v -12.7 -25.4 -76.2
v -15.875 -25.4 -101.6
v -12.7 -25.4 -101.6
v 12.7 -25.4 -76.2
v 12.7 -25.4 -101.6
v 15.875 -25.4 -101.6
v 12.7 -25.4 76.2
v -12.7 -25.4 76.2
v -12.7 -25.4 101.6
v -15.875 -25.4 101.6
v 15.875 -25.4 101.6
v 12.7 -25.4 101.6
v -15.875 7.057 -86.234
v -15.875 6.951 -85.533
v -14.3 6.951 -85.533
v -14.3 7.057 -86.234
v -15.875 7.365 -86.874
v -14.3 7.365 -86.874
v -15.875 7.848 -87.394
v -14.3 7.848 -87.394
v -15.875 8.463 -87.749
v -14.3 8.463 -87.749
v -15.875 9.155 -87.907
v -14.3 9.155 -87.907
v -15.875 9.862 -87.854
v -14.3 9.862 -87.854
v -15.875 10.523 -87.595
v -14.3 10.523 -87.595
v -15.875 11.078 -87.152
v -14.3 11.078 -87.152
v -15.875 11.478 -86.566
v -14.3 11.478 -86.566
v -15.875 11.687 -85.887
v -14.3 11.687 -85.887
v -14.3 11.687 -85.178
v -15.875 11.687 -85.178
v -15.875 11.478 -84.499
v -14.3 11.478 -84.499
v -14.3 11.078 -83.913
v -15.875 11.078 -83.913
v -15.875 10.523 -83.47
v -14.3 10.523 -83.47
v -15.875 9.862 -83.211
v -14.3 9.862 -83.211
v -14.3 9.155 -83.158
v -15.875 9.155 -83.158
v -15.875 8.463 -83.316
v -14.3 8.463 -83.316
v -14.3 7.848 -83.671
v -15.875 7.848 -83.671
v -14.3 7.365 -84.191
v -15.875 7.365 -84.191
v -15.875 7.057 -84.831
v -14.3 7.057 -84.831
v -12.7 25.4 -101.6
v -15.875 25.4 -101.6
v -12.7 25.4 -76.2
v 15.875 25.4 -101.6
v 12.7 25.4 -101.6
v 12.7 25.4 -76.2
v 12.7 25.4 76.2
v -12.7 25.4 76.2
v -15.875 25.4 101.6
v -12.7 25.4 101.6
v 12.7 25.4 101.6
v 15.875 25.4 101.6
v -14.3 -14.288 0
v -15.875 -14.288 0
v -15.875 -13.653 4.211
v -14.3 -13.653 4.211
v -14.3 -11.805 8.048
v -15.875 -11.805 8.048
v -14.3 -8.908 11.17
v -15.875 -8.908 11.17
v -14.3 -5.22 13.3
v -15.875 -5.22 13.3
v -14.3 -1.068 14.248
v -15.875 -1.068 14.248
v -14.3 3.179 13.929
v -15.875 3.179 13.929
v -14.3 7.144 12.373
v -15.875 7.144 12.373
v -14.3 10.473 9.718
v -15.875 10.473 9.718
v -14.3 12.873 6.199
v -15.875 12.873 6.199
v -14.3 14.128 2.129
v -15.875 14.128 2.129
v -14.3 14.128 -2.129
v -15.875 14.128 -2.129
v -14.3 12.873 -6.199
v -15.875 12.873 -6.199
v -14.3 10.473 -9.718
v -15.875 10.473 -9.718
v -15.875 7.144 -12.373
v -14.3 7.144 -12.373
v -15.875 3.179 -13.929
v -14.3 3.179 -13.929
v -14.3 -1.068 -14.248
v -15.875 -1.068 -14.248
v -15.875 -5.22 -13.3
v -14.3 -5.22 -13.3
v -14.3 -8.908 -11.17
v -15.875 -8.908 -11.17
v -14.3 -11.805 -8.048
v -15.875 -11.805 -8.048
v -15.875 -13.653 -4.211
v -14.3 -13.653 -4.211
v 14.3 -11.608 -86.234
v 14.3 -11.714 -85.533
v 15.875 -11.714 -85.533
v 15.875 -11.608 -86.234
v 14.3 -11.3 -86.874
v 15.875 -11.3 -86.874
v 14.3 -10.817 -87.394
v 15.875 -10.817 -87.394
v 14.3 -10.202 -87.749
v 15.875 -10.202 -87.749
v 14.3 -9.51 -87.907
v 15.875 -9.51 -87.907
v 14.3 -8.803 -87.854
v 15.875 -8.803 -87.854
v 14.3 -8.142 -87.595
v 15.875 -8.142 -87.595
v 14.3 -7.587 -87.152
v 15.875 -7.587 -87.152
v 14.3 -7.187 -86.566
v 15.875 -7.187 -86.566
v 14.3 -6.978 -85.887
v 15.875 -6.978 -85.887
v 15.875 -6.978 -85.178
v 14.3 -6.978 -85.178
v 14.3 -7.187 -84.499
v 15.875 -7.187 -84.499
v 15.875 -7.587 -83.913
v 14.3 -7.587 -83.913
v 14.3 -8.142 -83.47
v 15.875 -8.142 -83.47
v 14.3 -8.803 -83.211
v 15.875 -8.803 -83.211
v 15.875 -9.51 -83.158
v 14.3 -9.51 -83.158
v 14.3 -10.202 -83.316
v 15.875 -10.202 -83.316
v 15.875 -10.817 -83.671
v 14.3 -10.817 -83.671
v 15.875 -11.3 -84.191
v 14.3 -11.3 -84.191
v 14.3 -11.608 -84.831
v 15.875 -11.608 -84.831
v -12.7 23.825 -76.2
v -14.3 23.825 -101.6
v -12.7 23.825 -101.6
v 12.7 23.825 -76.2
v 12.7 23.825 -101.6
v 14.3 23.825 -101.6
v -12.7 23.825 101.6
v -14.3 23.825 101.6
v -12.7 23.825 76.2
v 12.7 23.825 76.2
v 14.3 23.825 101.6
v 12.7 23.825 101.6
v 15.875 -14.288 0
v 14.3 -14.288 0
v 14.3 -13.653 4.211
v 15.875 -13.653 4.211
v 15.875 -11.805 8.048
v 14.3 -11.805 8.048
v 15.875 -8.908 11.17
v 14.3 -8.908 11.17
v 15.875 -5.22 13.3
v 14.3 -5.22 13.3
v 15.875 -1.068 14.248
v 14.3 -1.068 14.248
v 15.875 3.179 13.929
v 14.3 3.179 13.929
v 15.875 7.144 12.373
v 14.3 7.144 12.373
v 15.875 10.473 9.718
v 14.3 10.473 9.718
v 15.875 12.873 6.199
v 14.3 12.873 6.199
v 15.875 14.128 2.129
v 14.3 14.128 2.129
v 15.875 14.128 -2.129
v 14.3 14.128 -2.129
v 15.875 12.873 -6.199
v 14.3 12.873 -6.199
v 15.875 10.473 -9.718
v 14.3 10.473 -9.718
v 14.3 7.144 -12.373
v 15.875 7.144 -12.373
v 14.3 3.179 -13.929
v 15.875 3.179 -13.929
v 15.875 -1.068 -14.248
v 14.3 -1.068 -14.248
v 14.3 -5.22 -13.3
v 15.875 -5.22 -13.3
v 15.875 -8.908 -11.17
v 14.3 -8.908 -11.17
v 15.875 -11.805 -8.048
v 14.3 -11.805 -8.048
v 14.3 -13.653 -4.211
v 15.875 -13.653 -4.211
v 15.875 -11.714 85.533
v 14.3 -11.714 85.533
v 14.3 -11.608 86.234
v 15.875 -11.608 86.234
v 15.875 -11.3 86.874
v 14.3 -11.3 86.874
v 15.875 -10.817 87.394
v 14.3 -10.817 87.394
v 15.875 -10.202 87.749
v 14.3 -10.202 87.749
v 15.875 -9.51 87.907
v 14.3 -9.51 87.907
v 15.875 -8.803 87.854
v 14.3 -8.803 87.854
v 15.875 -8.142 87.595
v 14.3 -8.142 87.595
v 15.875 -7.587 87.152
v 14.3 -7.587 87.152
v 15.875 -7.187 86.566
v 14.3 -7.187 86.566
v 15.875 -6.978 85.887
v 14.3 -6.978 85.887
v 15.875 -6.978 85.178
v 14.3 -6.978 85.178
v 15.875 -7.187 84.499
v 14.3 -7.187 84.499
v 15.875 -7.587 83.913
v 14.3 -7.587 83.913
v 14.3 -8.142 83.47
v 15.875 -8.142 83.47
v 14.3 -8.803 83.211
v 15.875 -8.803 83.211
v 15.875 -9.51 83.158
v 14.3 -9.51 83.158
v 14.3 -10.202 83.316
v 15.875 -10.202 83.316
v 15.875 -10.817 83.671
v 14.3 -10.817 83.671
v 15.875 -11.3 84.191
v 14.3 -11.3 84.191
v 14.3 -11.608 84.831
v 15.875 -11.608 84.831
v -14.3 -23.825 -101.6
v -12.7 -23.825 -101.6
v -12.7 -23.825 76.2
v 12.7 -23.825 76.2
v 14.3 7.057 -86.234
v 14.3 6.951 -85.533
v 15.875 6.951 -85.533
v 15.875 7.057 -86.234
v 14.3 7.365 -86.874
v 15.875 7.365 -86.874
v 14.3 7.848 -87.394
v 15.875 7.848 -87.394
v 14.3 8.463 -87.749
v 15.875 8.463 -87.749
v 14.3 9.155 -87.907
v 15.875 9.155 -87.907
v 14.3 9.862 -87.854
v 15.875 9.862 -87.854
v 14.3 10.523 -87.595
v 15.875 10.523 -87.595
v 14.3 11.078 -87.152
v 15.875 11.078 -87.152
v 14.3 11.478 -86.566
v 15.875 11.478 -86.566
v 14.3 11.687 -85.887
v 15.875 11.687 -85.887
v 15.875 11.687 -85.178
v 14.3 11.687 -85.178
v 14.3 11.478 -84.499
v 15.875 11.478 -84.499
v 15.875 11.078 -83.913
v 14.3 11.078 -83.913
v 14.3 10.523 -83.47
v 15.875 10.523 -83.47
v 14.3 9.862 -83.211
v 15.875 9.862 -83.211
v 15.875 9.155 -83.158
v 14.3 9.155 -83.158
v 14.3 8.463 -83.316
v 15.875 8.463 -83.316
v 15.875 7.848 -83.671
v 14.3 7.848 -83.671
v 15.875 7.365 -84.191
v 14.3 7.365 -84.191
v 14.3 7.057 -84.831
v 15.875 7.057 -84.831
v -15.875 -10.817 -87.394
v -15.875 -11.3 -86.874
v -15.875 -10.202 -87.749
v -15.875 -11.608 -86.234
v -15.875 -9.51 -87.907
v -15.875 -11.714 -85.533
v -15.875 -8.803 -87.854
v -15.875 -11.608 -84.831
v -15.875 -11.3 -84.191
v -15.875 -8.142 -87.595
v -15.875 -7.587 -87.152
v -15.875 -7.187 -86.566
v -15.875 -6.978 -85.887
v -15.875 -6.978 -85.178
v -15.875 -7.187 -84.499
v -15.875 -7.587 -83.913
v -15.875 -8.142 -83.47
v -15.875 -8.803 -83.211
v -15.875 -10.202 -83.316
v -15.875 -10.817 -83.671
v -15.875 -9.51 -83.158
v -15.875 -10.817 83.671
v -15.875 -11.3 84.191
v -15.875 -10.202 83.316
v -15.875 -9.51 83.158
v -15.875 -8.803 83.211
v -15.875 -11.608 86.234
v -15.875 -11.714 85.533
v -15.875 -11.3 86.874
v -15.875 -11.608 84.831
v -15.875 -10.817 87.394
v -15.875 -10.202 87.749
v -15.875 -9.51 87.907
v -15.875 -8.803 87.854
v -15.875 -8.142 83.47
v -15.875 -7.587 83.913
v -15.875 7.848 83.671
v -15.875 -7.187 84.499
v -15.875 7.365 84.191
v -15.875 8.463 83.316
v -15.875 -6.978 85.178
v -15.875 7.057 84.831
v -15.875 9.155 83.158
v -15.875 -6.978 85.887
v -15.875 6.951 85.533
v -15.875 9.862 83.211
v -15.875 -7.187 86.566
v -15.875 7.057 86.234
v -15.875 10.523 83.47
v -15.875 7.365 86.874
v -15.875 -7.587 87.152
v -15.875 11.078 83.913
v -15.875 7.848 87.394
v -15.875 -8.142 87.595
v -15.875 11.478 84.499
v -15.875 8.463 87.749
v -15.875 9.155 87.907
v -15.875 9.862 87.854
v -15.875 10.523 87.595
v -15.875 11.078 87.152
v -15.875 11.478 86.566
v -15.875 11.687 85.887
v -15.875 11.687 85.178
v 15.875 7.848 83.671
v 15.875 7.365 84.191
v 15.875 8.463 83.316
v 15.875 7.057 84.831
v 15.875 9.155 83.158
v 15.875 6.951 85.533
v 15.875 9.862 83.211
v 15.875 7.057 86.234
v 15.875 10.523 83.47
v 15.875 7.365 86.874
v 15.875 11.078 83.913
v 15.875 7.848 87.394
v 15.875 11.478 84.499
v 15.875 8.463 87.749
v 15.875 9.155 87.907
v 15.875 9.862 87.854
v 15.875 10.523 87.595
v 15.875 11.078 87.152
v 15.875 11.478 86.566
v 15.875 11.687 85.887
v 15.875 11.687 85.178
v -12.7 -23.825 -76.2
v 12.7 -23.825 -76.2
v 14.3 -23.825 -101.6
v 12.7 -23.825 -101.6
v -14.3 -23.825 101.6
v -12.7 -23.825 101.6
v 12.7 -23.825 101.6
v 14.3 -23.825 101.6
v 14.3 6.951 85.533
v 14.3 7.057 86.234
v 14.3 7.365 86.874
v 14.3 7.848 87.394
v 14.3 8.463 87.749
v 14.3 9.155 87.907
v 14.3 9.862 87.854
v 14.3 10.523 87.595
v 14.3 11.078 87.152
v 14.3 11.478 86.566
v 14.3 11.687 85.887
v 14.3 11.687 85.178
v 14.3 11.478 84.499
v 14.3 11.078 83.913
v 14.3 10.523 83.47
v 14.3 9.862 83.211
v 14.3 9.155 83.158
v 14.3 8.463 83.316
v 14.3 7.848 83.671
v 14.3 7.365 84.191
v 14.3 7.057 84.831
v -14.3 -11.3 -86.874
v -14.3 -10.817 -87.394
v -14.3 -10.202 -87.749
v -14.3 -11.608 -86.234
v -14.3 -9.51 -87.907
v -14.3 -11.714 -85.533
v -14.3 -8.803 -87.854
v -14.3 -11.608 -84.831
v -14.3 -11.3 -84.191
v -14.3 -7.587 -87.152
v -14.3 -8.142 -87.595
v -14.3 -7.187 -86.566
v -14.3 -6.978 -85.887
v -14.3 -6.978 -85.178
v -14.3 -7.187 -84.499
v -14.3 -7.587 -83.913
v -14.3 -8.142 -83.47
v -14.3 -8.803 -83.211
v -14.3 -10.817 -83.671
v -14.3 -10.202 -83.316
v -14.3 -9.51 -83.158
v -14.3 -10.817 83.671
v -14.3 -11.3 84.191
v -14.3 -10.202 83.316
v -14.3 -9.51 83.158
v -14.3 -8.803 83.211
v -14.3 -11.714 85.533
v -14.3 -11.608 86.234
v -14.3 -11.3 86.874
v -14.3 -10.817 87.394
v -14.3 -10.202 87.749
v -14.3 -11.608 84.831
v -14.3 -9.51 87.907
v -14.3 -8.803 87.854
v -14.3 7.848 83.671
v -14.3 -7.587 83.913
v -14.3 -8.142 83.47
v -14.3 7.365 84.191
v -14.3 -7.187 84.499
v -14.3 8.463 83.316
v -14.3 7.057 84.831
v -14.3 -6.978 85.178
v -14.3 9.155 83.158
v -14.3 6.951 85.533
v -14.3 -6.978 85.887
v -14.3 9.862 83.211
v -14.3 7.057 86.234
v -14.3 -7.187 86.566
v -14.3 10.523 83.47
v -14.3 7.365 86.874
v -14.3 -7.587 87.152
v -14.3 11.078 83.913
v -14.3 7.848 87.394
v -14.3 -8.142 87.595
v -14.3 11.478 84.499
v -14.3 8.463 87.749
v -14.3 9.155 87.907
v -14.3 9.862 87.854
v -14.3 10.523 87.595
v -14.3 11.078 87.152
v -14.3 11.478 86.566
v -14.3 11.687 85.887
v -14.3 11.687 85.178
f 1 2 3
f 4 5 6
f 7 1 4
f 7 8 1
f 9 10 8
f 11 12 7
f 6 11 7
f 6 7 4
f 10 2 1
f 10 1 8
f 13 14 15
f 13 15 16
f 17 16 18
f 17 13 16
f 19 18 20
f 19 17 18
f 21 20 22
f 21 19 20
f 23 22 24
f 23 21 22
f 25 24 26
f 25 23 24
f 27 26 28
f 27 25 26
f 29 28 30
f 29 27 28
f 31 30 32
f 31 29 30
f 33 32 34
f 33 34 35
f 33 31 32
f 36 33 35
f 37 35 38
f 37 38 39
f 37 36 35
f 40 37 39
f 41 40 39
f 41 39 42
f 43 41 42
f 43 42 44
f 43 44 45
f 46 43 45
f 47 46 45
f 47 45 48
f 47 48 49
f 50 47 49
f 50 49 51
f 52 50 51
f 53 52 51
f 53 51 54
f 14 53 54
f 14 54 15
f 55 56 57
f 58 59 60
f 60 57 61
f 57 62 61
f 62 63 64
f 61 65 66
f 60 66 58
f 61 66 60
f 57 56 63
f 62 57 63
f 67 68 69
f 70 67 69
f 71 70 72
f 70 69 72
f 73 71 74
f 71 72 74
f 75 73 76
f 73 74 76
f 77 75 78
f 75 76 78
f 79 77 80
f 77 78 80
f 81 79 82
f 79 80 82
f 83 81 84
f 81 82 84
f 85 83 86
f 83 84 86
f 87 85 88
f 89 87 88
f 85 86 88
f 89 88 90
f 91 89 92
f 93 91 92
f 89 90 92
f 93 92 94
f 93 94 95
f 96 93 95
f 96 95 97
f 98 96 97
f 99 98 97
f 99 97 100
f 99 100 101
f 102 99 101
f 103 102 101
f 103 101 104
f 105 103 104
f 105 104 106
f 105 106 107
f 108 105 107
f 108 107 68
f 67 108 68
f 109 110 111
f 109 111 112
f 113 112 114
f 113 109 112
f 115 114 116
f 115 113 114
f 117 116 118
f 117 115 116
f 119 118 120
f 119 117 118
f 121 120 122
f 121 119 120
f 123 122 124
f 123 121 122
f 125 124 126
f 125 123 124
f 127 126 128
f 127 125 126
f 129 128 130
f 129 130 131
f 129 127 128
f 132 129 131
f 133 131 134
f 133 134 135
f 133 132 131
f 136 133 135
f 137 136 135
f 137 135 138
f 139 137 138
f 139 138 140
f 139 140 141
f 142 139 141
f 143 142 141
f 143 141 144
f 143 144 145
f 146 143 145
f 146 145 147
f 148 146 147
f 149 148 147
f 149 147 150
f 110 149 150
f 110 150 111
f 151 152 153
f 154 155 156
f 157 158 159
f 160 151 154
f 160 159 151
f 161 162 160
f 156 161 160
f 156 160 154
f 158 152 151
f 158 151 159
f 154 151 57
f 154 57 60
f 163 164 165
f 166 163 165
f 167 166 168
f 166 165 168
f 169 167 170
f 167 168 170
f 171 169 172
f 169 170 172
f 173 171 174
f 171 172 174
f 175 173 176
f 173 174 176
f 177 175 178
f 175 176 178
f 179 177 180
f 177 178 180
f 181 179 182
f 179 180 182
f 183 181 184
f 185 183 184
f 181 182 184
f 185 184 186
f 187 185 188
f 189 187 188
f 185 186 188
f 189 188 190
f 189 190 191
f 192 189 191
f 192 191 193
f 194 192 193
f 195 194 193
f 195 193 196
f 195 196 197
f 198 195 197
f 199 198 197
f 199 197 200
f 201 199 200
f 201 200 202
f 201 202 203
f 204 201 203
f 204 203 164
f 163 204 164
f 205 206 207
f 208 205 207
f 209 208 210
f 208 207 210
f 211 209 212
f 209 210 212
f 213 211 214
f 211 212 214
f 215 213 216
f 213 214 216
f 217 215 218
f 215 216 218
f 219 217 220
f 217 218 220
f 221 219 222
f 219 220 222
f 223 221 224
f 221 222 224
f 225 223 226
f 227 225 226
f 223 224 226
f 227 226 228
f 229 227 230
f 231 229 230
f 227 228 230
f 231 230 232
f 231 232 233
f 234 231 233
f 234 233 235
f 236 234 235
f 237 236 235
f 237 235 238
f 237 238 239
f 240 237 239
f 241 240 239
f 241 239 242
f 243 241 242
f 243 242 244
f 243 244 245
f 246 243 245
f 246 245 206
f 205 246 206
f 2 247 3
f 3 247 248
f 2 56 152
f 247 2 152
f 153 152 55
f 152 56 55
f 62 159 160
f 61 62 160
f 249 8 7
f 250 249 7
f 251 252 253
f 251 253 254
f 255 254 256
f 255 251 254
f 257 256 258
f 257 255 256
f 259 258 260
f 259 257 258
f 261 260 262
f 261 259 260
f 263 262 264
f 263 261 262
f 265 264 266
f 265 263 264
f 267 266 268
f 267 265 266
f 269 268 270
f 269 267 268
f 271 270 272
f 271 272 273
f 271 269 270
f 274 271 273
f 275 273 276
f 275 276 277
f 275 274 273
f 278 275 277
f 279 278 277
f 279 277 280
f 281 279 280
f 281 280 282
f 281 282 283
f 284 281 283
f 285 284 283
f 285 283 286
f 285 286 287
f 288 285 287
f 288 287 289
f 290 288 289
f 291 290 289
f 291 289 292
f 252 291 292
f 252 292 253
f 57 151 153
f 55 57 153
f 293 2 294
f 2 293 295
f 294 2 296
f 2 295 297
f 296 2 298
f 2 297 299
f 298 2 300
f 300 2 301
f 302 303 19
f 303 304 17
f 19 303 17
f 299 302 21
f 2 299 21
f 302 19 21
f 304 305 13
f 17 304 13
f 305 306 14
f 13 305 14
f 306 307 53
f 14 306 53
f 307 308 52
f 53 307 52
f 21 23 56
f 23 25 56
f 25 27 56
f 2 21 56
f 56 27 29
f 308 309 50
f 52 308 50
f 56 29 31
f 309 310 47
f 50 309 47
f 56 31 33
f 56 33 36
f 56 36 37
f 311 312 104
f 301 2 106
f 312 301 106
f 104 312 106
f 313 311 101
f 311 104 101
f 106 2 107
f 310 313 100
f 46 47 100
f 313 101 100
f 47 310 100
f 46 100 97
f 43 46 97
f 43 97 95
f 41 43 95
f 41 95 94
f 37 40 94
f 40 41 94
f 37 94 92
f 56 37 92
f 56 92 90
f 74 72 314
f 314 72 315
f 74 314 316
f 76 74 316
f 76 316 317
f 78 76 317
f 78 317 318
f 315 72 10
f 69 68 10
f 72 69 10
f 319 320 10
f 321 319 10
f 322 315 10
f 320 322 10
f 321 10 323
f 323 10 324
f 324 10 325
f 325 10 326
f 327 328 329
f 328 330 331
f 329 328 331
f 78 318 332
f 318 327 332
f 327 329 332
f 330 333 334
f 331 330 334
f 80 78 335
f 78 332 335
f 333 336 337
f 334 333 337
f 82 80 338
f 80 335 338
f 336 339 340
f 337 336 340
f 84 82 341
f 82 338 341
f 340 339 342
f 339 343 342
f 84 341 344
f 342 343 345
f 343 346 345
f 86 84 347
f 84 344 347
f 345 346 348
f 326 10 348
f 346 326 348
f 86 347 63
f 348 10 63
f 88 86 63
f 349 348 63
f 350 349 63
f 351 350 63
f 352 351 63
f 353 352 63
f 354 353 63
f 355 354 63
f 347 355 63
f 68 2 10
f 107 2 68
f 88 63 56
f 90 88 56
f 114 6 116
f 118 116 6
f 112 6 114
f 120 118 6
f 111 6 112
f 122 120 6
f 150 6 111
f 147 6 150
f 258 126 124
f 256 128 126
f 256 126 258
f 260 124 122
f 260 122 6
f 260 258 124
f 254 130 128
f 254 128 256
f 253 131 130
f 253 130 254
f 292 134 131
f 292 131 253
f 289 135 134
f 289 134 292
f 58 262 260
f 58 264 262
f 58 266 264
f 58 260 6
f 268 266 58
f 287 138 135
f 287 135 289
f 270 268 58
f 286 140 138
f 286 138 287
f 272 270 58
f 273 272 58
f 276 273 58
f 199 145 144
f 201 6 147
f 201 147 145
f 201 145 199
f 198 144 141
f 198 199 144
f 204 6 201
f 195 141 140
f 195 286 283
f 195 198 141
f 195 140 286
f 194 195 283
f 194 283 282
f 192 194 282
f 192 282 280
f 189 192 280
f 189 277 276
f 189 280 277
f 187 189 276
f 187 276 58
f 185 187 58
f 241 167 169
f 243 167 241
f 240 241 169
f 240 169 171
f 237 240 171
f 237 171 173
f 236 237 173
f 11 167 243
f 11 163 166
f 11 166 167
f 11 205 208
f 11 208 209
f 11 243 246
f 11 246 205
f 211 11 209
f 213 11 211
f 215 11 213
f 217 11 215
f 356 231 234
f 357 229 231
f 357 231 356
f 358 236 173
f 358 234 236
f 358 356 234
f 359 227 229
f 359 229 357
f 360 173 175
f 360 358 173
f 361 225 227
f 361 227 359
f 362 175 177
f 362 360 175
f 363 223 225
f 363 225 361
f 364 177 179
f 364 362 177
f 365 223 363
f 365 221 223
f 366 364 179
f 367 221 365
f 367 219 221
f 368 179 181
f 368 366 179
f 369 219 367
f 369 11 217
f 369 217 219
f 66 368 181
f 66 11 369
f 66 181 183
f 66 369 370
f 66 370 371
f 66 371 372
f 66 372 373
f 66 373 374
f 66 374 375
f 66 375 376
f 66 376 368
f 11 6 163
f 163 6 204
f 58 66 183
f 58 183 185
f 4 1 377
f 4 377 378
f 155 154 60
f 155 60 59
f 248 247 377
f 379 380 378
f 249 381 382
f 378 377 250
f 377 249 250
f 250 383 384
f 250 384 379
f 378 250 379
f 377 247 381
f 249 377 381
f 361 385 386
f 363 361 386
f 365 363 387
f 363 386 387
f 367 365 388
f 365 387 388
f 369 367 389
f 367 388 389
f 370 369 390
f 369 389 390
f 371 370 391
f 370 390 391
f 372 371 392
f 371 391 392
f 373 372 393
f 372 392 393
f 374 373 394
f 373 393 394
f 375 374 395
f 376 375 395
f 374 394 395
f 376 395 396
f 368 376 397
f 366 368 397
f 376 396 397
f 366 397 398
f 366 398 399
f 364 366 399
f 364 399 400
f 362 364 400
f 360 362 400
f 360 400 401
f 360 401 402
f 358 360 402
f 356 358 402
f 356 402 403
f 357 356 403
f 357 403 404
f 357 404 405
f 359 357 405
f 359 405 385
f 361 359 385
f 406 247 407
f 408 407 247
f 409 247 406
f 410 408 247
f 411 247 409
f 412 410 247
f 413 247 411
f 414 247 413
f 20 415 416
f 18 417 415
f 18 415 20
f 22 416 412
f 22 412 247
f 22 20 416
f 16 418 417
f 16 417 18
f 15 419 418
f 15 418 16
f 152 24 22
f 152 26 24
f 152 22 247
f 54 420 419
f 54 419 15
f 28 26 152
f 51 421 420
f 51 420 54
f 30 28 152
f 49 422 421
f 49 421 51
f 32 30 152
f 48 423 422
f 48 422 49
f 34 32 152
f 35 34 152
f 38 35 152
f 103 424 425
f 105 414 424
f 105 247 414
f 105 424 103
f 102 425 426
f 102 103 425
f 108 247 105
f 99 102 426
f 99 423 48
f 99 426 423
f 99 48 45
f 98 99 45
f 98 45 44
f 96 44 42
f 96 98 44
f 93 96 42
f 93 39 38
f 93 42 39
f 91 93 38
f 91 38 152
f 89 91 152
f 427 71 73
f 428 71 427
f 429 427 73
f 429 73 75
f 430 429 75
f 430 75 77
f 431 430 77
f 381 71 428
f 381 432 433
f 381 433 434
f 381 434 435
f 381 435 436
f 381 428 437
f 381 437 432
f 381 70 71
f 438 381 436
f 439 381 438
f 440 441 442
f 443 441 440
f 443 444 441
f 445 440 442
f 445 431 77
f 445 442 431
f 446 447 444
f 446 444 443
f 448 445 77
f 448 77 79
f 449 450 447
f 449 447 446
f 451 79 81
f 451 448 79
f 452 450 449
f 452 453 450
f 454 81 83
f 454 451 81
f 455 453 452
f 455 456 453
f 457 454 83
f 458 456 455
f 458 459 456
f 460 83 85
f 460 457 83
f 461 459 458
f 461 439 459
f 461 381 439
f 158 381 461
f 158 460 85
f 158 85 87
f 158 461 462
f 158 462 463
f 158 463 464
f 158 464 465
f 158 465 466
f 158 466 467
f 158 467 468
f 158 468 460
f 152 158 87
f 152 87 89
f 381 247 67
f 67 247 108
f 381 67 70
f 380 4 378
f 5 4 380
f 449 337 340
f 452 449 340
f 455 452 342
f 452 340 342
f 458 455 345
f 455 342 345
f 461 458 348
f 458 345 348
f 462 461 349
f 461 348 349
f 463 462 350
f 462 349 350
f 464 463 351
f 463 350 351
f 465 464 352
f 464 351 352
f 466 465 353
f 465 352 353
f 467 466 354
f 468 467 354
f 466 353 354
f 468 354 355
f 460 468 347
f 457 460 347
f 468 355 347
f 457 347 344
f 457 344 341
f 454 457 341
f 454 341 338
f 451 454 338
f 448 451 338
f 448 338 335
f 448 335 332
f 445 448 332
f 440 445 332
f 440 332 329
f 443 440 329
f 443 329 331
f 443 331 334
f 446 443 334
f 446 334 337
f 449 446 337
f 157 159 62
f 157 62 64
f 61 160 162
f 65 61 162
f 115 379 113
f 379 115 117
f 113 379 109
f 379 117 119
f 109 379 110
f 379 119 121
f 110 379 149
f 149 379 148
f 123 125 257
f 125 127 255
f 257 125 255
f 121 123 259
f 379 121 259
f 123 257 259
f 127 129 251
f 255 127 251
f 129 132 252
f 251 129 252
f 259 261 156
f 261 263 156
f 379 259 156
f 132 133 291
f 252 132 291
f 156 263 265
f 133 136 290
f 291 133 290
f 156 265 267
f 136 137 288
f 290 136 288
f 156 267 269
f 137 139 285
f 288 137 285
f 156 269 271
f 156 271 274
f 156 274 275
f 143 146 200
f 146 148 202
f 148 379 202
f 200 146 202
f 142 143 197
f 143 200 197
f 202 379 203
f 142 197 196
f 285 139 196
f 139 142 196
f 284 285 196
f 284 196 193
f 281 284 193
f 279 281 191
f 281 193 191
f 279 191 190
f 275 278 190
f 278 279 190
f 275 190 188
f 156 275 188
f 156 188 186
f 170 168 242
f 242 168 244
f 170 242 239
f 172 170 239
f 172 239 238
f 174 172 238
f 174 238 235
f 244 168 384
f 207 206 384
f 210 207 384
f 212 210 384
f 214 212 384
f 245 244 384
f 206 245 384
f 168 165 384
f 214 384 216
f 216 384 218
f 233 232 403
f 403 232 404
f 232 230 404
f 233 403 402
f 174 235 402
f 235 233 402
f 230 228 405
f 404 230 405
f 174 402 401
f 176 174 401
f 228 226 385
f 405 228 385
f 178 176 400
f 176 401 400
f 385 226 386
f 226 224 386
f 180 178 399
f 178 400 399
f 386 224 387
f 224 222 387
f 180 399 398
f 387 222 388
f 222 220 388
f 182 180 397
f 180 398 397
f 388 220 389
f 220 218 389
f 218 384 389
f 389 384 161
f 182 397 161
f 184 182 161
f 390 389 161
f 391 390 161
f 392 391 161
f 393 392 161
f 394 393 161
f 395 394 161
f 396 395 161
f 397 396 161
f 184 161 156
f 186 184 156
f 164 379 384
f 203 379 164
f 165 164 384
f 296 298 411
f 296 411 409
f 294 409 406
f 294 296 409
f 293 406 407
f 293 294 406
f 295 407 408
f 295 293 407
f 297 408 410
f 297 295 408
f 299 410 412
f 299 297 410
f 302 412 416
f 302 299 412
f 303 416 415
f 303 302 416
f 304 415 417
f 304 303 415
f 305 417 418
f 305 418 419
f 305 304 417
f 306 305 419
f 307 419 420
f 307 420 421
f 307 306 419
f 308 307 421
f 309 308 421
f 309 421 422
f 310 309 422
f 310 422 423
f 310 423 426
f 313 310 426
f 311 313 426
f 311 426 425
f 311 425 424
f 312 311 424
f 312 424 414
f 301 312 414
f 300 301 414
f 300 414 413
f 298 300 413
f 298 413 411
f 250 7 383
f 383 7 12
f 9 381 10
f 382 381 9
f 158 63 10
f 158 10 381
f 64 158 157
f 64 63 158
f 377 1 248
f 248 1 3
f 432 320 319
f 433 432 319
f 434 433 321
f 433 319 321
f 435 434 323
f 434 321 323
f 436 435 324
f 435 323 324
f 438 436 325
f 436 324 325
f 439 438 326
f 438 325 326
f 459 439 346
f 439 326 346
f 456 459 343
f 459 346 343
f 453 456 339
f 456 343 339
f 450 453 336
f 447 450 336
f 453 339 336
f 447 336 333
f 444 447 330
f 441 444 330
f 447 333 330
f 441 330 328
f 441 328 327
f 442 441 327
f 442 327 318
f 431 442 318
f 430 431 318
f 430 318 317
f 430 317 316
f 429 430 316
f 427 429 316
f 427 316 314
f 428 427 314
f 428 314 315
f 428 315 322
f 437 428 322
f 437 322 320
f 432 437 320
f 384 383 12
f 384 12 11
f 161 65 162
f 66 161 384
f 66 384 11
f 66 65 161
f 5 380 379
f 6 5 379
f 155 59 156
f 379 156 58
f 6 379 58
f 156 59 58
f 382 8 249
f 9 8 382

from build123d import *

# Parameters (mm, degrees)
F0_W     = 31.75
F0_H     = 50.8
F0_W_2   = 28.6004
F0_H_2   = 47.6504
F1_DEPTH = 101.6
F2_W     = 25.4
F2_H     = 25.4
F3_DEPTH = 50.801
F4_R     = 2.38125
F5_DEPTH = 31.751
F7_R     = 14.2875
F8_DEPTH = 31.751


with BuildPart() as f1:
    # F0 (on Top) → F1 (new body)
    with BuildSketch(Plane.XY):
        Rectangle(F0_W, F0_H)
        Rectangle(F0_W_2, F0_H_2, mode=Mode.SUBTRACT)
    extrude(amount=F1_DEPTH)

    # F2 (on face) → F3 (cut, through all)
    with BuildSketch(Plane.XZ.offset(25.4)):
        with Locations((0, 88.9)):
            Rectangle(F2_W, F2_H)
    extrude(amount=-F3_DEPTH, mode=Mode.SUBTRACT)

    # F4 (on face) → F5 (cut, through all)
    with BuildSketch(Plane(origin=(-15.875, 0, 0), x_dir=(0, -1, 0), z_dir=(-1, 0, 0))):
        with Locations((-9.332526, 85.532526)):
            Circle(F4_R)
        with Locations((9.332526, 85.532526)):
            Circle(F4_R)
    extrude(amount=-F5_DEPTH, mode=Mode.SUBTRACT)

    # F6: F1 across plane


with BuildPart() as f1_1:
    add(f1.part)
    add(f1.part.mirror(Plane.XY))

    # F7 (on face) → F8 (cut, through all)
    with BuildSketch(Plane(origin=(-15.875, 0, 0), x_dir=(0, -1, 0), z_dir=(-1, 0, 0))):
        Circle(F7_R)
    extrude(amount=-F8_DEPTH, mode=Mode.SUBTRACT)


solid = f1_1.part
